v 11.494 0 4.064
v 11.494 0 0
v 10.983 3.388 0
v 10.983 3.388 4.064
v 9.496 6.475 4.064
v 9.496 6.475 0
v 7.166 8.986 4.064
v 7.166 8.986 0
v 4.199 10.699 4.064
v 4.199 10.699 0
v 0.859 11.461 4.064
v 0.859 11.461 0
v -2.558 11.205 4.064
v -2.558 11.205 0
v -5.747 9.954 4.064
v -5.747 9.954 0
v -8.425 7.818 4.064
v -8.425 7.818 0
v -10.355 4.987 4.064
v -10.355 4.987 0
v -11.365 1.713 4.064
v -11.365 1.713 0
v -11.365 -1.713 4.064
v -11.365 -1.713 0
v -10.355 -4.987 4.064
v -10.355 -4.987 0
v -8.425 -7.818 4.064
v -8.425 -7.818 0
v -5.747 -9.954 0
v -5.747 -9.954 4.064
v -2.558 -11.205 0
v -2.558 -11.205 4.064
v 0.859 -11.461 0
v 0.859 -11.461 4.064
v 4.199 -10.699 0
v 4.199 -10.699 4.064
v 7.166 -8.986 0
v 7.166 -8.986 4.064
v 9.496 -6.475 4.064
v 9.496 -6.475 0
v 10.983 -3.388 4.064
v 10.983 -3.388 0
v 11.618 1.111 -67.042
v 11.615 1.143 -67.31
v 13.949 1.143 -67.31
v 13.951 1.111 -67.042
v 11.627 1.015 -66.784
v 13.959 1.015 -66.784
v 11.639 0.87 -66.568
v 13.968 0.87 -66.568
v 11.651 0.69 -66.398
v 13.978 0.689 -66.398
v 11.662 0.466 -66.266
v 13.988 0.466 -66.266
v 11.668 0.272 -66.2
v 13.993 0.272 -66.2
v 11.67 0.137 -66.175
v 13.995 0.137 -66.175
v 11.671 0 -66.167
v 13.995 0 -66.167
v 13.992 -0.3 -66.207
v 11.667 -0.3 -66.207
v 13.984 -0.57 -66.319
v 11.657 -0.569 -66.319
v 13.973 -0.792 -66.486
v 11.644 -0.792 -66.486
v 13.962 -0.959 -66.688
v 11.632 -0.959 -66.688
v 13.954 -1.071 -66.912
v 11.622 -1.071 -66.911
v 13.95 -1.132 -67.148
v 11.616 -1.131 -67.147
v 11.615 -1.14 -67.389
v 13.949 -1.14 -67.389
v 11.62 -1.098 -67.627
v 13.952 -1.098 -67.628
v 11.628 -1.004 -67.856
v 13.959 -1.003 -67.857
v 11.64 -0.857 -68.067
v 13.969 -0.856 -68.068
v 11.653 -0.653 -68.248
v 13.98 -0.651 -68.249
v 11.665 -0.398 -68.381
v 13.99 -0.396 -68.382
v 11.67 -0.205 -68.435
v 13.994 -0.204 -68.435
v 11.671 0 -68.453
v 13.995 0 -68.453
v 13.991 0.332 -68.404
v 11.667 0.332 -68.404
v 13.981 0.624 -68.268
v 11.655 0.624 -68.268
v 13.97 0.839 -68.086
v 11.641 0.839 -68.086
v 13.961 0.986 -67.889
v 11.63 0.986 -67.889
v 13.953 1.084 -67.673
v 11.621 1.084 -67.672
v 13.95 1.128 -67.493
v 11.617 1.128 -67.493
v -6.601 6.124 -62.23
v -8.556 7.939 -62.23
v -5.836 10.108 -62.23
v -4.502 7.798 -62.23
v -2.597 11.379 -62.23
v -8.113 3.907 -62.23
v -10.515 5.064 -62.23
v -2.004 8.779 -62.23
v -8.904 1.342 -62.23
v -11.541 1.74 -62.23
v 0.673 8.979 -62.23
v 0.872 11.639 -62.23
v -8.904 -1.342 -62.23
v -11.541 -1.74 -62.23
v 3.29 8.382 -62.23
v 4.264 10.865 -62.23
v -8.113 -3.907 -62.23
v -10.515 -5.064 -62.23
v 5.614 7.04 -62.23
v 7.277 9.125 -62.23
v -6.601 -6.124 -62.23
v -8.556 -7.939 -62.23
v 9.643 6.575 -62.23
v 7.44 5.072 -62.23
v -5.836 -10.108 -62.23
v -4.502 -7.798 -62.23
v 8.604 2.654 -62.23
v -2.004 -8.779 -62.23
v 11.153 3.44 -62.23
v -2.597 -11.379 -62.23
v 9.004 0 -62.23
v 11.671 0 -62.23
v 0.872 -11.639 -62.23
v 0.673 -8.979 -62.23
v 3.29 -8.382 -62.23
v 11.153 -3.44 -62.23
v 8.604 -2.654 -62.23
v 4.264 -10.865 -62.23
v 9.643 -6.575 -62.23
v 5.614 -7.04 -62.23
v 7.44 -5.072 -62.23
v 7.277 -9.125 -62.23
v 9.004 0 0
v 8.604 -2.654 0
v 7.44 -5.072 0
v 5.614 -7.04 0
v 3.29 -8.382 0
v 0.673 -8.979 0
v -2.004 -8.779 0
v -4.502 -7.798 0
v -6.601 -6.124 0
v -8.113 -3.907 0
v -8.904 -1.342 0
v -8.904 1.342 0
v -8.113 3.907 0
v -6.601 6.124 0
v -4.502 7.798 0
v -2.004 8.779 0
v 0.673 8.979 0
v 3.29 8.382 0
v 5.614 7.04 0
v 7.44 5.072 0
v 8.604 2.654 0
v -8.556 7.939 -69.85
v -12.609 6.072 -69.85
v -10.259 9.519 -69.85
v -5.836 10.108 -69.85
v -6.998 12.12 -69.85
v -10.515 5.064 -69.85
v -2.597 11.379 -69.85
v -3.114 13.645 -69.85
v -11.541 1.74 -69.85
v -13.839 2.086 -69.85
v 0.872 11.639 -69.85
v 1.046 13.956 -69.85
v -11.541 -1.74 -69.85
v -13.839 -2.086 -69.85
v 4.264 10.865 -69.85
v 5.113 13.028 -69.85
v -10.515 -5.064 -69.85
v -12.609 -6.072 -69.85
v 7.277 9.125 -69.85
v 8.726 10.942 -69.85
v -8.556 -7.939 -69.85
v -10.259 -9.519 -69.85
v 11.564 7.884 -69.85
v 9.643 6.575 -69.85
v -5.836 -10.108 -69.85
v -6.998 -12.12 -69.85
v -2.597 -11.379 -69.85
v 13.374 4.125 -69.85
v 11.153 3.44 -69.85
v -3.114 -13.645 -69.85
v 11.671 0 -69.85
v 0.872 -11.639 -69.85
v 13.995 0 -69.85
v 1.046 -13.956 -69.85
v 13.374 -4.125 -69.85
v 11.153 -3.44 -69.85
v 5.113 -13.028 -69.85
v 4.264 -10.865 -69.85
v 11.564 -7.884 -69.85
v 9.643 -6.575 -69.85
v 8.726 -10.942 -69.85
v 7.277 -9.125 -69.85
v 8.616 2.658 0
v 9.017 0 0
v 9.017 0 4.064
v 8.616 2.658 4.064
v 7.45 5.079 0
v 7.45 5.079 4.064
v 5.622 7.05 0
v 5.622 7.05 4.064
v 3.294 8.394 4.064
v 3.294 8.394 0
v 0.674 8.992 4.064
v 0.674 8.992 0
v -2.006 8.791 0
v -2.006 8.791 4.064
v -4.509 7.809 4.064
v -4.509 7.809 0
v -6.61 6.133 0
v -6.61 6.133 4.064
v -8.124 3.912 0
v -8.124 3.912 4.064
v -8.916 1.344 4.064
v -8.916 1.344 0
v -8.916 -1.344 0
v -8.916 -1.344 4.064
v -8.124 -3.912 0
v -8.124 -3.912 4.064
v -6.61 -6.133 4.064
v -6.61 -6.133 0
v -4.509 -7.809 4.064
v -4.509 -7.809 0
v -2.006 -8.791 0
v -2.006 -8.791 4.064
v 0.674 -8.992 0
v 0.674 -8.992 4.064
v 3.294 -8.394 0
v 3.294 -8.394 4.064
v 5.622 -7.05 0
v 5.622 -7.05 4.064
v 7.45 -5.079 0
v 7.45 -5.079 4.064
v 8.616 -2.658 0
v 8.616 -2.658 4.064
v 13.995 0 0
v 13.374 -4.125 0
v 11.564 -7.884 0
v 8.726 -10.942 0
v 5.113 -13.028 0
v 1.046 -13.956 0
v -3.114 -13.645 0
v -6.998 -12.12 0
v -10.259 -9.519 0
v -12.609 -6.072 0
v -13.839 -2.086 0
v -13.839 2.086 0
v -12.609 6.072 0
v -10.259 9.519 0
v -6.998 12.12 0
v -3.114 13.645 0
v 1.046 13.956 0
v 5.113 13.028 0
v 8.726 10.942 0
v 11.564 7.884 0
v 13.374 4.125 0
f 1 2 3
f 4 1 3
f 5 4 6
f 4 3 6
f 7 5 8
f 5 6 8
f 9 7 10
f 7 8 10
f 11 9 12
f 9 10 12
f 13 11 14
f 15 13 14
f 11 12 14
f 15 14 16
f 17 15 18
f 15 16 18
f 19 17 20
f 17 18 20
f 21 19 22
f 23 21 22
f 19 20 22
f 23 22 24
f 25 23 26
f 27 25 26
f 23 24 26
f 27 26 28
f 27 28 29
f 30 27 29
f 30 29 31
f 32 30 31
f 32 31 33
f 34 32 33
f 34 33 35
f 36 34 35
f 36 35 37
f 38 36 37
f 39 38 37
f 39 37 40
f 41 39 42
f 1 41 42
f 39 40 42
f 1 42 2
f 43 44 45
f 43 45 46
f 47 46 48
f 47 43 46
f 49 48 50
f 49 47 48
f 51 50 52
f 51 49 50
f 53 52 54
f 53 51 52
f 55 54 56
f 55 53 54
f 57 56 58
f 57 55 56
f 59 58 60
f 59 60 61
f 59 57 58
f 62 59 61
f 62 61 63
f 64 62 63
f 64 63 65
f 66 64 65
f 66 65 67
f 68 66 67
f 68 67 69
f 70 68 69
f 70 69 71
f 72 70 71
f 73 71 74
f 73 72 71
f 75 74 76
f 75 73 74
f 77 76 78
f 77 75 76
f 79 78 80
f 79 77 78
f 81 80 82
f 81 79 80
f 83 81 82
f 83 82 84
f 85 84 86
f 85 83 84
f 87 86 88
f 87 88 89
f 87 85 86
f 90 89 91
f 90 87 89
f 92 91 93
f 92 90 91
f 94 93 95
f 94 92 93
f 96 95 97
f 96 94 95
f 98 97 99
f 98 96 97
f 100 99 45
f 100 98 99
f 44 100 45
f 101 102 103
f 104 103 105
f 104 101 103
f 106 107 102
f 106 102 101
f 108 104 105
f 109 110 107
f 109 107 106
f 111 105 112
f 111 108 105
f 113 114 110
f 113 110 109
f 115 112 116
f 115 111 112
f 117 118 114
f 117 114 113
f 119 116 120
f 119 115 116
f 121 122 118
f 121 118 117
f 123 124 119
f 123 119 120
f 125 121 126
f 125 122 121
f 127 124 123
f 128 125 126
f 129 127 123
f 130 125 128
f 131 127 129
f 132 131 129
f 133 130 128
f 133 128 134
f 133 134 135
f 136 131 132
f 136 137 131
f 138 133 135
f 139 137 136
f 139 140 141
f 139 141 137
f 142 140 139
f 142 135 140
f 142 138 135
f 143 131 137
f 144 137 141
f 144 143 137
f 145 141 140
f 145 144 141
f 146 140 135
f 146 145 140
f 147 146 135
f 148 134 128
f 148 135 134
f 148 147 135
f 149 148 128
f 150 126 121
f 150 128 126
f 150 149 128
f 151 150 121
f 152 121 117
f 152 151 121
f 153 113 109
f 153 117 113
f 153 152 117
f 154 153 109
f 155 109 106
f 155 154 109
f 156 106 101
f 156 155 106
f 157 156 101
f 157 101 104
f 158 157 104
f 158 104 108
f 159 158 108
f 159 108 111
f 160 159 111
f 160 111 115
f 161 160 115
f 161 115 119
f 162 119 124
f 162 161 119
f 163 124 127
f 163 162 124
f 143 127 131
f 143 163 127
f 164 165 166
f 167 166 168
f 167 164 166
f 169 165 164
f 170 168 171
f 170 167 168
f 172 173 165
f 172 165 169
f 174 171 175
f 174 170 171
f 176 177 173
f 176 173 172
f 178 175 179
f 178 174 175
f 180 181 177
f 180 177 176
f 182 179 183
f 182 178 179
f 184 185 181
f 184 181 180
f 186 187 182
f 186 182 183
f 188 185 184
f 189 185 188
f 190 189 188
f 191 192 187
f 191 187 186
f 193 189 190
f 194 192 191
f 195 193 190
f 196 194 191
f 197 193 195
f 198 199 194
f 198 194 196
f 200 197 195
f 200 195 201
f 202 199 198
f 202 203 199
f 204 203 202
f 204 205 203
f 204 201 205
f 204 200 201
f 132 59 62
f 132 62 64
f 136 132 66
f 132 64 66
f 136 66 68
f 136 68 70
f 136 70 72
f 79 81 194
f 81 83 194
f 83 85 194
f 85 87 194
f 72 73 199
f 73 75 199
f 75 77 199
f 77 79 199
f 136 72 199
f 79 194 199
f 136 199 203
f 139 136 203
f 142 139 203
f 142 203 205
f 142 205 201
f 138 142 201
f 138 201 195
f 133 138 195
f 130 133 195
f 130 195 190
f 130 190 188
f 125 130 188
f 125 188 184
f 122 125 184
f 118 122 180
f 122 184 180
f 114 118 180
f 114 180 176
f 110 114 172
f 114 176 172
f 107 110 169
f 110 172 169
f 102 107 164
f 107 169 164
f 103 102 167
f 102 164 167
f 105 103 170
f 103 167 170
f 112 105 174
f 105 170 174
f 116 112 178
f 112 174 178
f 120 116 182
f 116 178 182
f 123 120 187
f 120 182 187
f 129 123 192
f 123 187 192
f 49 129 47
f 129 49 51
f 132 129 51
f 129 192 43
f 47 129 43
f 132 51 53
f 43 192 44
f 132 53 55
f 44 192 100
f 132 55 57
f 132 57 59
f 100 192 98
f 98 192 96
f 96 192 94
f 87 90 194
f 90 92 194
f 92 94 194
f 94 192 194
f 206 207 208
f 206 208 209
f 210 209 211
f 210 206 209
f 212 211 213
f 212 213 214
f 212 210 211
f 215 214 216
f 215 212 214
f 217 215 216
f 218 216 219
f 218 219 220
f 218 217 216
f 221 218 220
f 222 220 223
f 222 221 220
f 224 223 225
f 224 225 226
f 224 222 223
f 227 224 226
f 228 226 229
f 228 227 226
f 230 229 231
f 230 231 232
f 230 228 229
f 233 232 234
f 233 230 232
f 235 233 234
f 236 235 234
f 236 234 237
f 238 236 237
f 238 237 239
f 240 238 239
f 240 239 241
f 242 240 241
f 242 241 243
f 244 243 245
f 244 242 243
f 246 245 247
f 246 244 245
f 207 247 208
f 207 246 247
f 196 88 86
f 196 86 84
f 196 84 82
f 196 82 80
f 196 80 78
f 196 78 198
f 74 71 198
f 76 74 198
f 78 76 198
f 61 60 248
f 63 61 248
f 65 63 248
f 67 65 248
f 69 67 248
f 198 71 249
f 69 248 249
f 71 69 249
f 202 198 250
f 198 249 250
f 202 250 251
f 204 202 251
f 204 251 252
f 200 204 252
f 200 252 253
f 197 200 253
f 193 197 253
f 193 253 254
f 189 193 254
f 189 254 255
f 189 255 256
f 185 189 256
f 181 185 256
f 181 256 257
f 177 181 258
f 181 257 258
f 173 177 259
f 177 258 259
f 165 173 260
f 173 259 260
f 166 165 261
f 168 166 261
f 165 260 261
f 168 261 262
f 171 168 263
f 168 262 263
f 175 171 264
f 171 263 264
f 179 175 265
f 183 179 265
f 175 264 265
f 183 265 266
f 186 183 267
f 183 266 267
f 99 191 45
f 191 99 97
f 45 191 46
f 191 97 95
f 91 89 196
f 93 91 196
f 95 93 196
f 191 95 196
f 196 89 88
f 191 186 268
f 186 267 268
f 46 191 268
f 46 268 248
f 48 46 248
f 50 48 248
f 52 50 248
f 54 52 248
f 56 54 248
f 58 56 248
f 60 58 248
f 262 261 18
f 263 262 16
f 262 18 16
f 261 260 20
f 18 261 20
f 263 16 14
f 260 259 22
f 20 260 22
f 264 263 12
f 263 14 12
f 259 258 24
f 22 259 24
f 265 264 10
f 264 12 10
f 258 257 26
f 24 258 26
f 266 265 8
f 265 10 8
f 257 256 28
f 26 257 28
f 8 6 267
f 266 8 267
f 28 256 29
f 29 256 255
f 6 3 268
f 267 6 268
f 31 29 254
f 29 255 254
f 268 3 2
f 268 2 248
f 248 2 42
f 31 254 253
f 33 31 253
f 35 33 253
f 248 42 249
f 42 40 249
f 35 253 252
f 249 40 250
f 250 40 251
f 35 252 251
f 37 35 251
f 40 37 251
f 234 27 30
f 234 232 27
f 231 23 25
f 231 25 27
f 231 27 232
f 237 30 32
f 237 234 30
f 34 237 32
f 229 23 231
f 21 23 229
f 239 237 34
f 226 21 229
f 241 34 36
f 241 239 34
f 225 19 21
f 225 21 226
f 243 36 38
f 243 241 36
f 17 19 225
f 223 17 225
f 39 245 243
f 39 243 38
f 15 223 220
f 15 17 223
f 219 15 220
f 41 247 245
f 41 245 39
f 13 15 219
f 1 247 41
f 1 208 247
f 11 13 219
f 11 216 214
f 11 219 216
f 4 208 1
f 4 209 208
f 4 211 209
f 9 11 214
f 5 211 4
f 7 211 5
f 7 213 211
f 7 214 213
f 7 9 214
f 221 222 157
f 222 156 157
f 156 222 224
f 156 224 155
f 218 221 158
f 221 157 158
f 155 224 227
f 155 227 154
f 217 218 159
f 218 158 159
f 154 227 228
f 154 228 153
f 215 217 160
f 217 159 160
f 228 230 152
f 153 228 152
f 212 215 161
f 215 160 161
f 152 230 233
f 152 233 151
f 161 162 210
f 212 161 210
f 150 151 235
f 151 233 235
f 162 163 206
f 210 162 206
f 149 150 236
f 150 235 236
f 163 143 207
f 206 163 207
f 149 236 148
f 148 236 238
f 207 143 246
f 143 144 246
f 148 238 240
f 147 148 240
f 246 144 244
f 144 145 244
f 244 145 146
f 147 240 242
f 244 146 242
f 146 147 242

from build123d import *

# Parameters (mm, degrees)
F0_R     = 11.4935
F0_R_2   = 9.017
F1_DEPTH = 4.064
F2_R     = 13.9954
F2_R_2   = 9.0043
F3_DEPTH = 69.85
F4_R     = 11.6713
F5_DEPTH = 7.62
F6_R     = 1.143
F7_DEPTH = 13.9964


with BuildPart() as f1:
    # F0 (on Top) → F1 (new body)
    with BuildSketch(Plane.XY):
        Circle(F0_R)
        Circle(F0_R_2, mode=Mode.SUBTRACT)
    extrude(amount=F1_DEPTH)

    # F2 (on face) → F3 (join)
    with BuildSketch(Plane(origin=(0, 0, 0), x_dir=(1, 0, 0), z_dir=(0, 0, -1))):
        Circle(F2_R)
        Circle(F2_R_2, mode=Mode.SUBTRACT)
    extrude(amount=F3_DEPTH)

    # F4 (on face) → F5 (cut)
    with BuildSketch(Plane(origin=(0, 0, -69.85), x_dir=(1, 0, 0), z_dir=(0, 0, -1))):
        Circle(F4_R)
    extrude(amount=-F5_DEPTH, mode=Mode.SUBTRACT)

    # F6 (on Right) → F7 (cut, through all)
    with BuildSketch(Plane.YZ):
        with Locations((0, -67.31)):
            Circle(F6_R)
    extrude(amount=F7_DEPTH, mode=Mode.SUBTRACT)


solid = f1.part
